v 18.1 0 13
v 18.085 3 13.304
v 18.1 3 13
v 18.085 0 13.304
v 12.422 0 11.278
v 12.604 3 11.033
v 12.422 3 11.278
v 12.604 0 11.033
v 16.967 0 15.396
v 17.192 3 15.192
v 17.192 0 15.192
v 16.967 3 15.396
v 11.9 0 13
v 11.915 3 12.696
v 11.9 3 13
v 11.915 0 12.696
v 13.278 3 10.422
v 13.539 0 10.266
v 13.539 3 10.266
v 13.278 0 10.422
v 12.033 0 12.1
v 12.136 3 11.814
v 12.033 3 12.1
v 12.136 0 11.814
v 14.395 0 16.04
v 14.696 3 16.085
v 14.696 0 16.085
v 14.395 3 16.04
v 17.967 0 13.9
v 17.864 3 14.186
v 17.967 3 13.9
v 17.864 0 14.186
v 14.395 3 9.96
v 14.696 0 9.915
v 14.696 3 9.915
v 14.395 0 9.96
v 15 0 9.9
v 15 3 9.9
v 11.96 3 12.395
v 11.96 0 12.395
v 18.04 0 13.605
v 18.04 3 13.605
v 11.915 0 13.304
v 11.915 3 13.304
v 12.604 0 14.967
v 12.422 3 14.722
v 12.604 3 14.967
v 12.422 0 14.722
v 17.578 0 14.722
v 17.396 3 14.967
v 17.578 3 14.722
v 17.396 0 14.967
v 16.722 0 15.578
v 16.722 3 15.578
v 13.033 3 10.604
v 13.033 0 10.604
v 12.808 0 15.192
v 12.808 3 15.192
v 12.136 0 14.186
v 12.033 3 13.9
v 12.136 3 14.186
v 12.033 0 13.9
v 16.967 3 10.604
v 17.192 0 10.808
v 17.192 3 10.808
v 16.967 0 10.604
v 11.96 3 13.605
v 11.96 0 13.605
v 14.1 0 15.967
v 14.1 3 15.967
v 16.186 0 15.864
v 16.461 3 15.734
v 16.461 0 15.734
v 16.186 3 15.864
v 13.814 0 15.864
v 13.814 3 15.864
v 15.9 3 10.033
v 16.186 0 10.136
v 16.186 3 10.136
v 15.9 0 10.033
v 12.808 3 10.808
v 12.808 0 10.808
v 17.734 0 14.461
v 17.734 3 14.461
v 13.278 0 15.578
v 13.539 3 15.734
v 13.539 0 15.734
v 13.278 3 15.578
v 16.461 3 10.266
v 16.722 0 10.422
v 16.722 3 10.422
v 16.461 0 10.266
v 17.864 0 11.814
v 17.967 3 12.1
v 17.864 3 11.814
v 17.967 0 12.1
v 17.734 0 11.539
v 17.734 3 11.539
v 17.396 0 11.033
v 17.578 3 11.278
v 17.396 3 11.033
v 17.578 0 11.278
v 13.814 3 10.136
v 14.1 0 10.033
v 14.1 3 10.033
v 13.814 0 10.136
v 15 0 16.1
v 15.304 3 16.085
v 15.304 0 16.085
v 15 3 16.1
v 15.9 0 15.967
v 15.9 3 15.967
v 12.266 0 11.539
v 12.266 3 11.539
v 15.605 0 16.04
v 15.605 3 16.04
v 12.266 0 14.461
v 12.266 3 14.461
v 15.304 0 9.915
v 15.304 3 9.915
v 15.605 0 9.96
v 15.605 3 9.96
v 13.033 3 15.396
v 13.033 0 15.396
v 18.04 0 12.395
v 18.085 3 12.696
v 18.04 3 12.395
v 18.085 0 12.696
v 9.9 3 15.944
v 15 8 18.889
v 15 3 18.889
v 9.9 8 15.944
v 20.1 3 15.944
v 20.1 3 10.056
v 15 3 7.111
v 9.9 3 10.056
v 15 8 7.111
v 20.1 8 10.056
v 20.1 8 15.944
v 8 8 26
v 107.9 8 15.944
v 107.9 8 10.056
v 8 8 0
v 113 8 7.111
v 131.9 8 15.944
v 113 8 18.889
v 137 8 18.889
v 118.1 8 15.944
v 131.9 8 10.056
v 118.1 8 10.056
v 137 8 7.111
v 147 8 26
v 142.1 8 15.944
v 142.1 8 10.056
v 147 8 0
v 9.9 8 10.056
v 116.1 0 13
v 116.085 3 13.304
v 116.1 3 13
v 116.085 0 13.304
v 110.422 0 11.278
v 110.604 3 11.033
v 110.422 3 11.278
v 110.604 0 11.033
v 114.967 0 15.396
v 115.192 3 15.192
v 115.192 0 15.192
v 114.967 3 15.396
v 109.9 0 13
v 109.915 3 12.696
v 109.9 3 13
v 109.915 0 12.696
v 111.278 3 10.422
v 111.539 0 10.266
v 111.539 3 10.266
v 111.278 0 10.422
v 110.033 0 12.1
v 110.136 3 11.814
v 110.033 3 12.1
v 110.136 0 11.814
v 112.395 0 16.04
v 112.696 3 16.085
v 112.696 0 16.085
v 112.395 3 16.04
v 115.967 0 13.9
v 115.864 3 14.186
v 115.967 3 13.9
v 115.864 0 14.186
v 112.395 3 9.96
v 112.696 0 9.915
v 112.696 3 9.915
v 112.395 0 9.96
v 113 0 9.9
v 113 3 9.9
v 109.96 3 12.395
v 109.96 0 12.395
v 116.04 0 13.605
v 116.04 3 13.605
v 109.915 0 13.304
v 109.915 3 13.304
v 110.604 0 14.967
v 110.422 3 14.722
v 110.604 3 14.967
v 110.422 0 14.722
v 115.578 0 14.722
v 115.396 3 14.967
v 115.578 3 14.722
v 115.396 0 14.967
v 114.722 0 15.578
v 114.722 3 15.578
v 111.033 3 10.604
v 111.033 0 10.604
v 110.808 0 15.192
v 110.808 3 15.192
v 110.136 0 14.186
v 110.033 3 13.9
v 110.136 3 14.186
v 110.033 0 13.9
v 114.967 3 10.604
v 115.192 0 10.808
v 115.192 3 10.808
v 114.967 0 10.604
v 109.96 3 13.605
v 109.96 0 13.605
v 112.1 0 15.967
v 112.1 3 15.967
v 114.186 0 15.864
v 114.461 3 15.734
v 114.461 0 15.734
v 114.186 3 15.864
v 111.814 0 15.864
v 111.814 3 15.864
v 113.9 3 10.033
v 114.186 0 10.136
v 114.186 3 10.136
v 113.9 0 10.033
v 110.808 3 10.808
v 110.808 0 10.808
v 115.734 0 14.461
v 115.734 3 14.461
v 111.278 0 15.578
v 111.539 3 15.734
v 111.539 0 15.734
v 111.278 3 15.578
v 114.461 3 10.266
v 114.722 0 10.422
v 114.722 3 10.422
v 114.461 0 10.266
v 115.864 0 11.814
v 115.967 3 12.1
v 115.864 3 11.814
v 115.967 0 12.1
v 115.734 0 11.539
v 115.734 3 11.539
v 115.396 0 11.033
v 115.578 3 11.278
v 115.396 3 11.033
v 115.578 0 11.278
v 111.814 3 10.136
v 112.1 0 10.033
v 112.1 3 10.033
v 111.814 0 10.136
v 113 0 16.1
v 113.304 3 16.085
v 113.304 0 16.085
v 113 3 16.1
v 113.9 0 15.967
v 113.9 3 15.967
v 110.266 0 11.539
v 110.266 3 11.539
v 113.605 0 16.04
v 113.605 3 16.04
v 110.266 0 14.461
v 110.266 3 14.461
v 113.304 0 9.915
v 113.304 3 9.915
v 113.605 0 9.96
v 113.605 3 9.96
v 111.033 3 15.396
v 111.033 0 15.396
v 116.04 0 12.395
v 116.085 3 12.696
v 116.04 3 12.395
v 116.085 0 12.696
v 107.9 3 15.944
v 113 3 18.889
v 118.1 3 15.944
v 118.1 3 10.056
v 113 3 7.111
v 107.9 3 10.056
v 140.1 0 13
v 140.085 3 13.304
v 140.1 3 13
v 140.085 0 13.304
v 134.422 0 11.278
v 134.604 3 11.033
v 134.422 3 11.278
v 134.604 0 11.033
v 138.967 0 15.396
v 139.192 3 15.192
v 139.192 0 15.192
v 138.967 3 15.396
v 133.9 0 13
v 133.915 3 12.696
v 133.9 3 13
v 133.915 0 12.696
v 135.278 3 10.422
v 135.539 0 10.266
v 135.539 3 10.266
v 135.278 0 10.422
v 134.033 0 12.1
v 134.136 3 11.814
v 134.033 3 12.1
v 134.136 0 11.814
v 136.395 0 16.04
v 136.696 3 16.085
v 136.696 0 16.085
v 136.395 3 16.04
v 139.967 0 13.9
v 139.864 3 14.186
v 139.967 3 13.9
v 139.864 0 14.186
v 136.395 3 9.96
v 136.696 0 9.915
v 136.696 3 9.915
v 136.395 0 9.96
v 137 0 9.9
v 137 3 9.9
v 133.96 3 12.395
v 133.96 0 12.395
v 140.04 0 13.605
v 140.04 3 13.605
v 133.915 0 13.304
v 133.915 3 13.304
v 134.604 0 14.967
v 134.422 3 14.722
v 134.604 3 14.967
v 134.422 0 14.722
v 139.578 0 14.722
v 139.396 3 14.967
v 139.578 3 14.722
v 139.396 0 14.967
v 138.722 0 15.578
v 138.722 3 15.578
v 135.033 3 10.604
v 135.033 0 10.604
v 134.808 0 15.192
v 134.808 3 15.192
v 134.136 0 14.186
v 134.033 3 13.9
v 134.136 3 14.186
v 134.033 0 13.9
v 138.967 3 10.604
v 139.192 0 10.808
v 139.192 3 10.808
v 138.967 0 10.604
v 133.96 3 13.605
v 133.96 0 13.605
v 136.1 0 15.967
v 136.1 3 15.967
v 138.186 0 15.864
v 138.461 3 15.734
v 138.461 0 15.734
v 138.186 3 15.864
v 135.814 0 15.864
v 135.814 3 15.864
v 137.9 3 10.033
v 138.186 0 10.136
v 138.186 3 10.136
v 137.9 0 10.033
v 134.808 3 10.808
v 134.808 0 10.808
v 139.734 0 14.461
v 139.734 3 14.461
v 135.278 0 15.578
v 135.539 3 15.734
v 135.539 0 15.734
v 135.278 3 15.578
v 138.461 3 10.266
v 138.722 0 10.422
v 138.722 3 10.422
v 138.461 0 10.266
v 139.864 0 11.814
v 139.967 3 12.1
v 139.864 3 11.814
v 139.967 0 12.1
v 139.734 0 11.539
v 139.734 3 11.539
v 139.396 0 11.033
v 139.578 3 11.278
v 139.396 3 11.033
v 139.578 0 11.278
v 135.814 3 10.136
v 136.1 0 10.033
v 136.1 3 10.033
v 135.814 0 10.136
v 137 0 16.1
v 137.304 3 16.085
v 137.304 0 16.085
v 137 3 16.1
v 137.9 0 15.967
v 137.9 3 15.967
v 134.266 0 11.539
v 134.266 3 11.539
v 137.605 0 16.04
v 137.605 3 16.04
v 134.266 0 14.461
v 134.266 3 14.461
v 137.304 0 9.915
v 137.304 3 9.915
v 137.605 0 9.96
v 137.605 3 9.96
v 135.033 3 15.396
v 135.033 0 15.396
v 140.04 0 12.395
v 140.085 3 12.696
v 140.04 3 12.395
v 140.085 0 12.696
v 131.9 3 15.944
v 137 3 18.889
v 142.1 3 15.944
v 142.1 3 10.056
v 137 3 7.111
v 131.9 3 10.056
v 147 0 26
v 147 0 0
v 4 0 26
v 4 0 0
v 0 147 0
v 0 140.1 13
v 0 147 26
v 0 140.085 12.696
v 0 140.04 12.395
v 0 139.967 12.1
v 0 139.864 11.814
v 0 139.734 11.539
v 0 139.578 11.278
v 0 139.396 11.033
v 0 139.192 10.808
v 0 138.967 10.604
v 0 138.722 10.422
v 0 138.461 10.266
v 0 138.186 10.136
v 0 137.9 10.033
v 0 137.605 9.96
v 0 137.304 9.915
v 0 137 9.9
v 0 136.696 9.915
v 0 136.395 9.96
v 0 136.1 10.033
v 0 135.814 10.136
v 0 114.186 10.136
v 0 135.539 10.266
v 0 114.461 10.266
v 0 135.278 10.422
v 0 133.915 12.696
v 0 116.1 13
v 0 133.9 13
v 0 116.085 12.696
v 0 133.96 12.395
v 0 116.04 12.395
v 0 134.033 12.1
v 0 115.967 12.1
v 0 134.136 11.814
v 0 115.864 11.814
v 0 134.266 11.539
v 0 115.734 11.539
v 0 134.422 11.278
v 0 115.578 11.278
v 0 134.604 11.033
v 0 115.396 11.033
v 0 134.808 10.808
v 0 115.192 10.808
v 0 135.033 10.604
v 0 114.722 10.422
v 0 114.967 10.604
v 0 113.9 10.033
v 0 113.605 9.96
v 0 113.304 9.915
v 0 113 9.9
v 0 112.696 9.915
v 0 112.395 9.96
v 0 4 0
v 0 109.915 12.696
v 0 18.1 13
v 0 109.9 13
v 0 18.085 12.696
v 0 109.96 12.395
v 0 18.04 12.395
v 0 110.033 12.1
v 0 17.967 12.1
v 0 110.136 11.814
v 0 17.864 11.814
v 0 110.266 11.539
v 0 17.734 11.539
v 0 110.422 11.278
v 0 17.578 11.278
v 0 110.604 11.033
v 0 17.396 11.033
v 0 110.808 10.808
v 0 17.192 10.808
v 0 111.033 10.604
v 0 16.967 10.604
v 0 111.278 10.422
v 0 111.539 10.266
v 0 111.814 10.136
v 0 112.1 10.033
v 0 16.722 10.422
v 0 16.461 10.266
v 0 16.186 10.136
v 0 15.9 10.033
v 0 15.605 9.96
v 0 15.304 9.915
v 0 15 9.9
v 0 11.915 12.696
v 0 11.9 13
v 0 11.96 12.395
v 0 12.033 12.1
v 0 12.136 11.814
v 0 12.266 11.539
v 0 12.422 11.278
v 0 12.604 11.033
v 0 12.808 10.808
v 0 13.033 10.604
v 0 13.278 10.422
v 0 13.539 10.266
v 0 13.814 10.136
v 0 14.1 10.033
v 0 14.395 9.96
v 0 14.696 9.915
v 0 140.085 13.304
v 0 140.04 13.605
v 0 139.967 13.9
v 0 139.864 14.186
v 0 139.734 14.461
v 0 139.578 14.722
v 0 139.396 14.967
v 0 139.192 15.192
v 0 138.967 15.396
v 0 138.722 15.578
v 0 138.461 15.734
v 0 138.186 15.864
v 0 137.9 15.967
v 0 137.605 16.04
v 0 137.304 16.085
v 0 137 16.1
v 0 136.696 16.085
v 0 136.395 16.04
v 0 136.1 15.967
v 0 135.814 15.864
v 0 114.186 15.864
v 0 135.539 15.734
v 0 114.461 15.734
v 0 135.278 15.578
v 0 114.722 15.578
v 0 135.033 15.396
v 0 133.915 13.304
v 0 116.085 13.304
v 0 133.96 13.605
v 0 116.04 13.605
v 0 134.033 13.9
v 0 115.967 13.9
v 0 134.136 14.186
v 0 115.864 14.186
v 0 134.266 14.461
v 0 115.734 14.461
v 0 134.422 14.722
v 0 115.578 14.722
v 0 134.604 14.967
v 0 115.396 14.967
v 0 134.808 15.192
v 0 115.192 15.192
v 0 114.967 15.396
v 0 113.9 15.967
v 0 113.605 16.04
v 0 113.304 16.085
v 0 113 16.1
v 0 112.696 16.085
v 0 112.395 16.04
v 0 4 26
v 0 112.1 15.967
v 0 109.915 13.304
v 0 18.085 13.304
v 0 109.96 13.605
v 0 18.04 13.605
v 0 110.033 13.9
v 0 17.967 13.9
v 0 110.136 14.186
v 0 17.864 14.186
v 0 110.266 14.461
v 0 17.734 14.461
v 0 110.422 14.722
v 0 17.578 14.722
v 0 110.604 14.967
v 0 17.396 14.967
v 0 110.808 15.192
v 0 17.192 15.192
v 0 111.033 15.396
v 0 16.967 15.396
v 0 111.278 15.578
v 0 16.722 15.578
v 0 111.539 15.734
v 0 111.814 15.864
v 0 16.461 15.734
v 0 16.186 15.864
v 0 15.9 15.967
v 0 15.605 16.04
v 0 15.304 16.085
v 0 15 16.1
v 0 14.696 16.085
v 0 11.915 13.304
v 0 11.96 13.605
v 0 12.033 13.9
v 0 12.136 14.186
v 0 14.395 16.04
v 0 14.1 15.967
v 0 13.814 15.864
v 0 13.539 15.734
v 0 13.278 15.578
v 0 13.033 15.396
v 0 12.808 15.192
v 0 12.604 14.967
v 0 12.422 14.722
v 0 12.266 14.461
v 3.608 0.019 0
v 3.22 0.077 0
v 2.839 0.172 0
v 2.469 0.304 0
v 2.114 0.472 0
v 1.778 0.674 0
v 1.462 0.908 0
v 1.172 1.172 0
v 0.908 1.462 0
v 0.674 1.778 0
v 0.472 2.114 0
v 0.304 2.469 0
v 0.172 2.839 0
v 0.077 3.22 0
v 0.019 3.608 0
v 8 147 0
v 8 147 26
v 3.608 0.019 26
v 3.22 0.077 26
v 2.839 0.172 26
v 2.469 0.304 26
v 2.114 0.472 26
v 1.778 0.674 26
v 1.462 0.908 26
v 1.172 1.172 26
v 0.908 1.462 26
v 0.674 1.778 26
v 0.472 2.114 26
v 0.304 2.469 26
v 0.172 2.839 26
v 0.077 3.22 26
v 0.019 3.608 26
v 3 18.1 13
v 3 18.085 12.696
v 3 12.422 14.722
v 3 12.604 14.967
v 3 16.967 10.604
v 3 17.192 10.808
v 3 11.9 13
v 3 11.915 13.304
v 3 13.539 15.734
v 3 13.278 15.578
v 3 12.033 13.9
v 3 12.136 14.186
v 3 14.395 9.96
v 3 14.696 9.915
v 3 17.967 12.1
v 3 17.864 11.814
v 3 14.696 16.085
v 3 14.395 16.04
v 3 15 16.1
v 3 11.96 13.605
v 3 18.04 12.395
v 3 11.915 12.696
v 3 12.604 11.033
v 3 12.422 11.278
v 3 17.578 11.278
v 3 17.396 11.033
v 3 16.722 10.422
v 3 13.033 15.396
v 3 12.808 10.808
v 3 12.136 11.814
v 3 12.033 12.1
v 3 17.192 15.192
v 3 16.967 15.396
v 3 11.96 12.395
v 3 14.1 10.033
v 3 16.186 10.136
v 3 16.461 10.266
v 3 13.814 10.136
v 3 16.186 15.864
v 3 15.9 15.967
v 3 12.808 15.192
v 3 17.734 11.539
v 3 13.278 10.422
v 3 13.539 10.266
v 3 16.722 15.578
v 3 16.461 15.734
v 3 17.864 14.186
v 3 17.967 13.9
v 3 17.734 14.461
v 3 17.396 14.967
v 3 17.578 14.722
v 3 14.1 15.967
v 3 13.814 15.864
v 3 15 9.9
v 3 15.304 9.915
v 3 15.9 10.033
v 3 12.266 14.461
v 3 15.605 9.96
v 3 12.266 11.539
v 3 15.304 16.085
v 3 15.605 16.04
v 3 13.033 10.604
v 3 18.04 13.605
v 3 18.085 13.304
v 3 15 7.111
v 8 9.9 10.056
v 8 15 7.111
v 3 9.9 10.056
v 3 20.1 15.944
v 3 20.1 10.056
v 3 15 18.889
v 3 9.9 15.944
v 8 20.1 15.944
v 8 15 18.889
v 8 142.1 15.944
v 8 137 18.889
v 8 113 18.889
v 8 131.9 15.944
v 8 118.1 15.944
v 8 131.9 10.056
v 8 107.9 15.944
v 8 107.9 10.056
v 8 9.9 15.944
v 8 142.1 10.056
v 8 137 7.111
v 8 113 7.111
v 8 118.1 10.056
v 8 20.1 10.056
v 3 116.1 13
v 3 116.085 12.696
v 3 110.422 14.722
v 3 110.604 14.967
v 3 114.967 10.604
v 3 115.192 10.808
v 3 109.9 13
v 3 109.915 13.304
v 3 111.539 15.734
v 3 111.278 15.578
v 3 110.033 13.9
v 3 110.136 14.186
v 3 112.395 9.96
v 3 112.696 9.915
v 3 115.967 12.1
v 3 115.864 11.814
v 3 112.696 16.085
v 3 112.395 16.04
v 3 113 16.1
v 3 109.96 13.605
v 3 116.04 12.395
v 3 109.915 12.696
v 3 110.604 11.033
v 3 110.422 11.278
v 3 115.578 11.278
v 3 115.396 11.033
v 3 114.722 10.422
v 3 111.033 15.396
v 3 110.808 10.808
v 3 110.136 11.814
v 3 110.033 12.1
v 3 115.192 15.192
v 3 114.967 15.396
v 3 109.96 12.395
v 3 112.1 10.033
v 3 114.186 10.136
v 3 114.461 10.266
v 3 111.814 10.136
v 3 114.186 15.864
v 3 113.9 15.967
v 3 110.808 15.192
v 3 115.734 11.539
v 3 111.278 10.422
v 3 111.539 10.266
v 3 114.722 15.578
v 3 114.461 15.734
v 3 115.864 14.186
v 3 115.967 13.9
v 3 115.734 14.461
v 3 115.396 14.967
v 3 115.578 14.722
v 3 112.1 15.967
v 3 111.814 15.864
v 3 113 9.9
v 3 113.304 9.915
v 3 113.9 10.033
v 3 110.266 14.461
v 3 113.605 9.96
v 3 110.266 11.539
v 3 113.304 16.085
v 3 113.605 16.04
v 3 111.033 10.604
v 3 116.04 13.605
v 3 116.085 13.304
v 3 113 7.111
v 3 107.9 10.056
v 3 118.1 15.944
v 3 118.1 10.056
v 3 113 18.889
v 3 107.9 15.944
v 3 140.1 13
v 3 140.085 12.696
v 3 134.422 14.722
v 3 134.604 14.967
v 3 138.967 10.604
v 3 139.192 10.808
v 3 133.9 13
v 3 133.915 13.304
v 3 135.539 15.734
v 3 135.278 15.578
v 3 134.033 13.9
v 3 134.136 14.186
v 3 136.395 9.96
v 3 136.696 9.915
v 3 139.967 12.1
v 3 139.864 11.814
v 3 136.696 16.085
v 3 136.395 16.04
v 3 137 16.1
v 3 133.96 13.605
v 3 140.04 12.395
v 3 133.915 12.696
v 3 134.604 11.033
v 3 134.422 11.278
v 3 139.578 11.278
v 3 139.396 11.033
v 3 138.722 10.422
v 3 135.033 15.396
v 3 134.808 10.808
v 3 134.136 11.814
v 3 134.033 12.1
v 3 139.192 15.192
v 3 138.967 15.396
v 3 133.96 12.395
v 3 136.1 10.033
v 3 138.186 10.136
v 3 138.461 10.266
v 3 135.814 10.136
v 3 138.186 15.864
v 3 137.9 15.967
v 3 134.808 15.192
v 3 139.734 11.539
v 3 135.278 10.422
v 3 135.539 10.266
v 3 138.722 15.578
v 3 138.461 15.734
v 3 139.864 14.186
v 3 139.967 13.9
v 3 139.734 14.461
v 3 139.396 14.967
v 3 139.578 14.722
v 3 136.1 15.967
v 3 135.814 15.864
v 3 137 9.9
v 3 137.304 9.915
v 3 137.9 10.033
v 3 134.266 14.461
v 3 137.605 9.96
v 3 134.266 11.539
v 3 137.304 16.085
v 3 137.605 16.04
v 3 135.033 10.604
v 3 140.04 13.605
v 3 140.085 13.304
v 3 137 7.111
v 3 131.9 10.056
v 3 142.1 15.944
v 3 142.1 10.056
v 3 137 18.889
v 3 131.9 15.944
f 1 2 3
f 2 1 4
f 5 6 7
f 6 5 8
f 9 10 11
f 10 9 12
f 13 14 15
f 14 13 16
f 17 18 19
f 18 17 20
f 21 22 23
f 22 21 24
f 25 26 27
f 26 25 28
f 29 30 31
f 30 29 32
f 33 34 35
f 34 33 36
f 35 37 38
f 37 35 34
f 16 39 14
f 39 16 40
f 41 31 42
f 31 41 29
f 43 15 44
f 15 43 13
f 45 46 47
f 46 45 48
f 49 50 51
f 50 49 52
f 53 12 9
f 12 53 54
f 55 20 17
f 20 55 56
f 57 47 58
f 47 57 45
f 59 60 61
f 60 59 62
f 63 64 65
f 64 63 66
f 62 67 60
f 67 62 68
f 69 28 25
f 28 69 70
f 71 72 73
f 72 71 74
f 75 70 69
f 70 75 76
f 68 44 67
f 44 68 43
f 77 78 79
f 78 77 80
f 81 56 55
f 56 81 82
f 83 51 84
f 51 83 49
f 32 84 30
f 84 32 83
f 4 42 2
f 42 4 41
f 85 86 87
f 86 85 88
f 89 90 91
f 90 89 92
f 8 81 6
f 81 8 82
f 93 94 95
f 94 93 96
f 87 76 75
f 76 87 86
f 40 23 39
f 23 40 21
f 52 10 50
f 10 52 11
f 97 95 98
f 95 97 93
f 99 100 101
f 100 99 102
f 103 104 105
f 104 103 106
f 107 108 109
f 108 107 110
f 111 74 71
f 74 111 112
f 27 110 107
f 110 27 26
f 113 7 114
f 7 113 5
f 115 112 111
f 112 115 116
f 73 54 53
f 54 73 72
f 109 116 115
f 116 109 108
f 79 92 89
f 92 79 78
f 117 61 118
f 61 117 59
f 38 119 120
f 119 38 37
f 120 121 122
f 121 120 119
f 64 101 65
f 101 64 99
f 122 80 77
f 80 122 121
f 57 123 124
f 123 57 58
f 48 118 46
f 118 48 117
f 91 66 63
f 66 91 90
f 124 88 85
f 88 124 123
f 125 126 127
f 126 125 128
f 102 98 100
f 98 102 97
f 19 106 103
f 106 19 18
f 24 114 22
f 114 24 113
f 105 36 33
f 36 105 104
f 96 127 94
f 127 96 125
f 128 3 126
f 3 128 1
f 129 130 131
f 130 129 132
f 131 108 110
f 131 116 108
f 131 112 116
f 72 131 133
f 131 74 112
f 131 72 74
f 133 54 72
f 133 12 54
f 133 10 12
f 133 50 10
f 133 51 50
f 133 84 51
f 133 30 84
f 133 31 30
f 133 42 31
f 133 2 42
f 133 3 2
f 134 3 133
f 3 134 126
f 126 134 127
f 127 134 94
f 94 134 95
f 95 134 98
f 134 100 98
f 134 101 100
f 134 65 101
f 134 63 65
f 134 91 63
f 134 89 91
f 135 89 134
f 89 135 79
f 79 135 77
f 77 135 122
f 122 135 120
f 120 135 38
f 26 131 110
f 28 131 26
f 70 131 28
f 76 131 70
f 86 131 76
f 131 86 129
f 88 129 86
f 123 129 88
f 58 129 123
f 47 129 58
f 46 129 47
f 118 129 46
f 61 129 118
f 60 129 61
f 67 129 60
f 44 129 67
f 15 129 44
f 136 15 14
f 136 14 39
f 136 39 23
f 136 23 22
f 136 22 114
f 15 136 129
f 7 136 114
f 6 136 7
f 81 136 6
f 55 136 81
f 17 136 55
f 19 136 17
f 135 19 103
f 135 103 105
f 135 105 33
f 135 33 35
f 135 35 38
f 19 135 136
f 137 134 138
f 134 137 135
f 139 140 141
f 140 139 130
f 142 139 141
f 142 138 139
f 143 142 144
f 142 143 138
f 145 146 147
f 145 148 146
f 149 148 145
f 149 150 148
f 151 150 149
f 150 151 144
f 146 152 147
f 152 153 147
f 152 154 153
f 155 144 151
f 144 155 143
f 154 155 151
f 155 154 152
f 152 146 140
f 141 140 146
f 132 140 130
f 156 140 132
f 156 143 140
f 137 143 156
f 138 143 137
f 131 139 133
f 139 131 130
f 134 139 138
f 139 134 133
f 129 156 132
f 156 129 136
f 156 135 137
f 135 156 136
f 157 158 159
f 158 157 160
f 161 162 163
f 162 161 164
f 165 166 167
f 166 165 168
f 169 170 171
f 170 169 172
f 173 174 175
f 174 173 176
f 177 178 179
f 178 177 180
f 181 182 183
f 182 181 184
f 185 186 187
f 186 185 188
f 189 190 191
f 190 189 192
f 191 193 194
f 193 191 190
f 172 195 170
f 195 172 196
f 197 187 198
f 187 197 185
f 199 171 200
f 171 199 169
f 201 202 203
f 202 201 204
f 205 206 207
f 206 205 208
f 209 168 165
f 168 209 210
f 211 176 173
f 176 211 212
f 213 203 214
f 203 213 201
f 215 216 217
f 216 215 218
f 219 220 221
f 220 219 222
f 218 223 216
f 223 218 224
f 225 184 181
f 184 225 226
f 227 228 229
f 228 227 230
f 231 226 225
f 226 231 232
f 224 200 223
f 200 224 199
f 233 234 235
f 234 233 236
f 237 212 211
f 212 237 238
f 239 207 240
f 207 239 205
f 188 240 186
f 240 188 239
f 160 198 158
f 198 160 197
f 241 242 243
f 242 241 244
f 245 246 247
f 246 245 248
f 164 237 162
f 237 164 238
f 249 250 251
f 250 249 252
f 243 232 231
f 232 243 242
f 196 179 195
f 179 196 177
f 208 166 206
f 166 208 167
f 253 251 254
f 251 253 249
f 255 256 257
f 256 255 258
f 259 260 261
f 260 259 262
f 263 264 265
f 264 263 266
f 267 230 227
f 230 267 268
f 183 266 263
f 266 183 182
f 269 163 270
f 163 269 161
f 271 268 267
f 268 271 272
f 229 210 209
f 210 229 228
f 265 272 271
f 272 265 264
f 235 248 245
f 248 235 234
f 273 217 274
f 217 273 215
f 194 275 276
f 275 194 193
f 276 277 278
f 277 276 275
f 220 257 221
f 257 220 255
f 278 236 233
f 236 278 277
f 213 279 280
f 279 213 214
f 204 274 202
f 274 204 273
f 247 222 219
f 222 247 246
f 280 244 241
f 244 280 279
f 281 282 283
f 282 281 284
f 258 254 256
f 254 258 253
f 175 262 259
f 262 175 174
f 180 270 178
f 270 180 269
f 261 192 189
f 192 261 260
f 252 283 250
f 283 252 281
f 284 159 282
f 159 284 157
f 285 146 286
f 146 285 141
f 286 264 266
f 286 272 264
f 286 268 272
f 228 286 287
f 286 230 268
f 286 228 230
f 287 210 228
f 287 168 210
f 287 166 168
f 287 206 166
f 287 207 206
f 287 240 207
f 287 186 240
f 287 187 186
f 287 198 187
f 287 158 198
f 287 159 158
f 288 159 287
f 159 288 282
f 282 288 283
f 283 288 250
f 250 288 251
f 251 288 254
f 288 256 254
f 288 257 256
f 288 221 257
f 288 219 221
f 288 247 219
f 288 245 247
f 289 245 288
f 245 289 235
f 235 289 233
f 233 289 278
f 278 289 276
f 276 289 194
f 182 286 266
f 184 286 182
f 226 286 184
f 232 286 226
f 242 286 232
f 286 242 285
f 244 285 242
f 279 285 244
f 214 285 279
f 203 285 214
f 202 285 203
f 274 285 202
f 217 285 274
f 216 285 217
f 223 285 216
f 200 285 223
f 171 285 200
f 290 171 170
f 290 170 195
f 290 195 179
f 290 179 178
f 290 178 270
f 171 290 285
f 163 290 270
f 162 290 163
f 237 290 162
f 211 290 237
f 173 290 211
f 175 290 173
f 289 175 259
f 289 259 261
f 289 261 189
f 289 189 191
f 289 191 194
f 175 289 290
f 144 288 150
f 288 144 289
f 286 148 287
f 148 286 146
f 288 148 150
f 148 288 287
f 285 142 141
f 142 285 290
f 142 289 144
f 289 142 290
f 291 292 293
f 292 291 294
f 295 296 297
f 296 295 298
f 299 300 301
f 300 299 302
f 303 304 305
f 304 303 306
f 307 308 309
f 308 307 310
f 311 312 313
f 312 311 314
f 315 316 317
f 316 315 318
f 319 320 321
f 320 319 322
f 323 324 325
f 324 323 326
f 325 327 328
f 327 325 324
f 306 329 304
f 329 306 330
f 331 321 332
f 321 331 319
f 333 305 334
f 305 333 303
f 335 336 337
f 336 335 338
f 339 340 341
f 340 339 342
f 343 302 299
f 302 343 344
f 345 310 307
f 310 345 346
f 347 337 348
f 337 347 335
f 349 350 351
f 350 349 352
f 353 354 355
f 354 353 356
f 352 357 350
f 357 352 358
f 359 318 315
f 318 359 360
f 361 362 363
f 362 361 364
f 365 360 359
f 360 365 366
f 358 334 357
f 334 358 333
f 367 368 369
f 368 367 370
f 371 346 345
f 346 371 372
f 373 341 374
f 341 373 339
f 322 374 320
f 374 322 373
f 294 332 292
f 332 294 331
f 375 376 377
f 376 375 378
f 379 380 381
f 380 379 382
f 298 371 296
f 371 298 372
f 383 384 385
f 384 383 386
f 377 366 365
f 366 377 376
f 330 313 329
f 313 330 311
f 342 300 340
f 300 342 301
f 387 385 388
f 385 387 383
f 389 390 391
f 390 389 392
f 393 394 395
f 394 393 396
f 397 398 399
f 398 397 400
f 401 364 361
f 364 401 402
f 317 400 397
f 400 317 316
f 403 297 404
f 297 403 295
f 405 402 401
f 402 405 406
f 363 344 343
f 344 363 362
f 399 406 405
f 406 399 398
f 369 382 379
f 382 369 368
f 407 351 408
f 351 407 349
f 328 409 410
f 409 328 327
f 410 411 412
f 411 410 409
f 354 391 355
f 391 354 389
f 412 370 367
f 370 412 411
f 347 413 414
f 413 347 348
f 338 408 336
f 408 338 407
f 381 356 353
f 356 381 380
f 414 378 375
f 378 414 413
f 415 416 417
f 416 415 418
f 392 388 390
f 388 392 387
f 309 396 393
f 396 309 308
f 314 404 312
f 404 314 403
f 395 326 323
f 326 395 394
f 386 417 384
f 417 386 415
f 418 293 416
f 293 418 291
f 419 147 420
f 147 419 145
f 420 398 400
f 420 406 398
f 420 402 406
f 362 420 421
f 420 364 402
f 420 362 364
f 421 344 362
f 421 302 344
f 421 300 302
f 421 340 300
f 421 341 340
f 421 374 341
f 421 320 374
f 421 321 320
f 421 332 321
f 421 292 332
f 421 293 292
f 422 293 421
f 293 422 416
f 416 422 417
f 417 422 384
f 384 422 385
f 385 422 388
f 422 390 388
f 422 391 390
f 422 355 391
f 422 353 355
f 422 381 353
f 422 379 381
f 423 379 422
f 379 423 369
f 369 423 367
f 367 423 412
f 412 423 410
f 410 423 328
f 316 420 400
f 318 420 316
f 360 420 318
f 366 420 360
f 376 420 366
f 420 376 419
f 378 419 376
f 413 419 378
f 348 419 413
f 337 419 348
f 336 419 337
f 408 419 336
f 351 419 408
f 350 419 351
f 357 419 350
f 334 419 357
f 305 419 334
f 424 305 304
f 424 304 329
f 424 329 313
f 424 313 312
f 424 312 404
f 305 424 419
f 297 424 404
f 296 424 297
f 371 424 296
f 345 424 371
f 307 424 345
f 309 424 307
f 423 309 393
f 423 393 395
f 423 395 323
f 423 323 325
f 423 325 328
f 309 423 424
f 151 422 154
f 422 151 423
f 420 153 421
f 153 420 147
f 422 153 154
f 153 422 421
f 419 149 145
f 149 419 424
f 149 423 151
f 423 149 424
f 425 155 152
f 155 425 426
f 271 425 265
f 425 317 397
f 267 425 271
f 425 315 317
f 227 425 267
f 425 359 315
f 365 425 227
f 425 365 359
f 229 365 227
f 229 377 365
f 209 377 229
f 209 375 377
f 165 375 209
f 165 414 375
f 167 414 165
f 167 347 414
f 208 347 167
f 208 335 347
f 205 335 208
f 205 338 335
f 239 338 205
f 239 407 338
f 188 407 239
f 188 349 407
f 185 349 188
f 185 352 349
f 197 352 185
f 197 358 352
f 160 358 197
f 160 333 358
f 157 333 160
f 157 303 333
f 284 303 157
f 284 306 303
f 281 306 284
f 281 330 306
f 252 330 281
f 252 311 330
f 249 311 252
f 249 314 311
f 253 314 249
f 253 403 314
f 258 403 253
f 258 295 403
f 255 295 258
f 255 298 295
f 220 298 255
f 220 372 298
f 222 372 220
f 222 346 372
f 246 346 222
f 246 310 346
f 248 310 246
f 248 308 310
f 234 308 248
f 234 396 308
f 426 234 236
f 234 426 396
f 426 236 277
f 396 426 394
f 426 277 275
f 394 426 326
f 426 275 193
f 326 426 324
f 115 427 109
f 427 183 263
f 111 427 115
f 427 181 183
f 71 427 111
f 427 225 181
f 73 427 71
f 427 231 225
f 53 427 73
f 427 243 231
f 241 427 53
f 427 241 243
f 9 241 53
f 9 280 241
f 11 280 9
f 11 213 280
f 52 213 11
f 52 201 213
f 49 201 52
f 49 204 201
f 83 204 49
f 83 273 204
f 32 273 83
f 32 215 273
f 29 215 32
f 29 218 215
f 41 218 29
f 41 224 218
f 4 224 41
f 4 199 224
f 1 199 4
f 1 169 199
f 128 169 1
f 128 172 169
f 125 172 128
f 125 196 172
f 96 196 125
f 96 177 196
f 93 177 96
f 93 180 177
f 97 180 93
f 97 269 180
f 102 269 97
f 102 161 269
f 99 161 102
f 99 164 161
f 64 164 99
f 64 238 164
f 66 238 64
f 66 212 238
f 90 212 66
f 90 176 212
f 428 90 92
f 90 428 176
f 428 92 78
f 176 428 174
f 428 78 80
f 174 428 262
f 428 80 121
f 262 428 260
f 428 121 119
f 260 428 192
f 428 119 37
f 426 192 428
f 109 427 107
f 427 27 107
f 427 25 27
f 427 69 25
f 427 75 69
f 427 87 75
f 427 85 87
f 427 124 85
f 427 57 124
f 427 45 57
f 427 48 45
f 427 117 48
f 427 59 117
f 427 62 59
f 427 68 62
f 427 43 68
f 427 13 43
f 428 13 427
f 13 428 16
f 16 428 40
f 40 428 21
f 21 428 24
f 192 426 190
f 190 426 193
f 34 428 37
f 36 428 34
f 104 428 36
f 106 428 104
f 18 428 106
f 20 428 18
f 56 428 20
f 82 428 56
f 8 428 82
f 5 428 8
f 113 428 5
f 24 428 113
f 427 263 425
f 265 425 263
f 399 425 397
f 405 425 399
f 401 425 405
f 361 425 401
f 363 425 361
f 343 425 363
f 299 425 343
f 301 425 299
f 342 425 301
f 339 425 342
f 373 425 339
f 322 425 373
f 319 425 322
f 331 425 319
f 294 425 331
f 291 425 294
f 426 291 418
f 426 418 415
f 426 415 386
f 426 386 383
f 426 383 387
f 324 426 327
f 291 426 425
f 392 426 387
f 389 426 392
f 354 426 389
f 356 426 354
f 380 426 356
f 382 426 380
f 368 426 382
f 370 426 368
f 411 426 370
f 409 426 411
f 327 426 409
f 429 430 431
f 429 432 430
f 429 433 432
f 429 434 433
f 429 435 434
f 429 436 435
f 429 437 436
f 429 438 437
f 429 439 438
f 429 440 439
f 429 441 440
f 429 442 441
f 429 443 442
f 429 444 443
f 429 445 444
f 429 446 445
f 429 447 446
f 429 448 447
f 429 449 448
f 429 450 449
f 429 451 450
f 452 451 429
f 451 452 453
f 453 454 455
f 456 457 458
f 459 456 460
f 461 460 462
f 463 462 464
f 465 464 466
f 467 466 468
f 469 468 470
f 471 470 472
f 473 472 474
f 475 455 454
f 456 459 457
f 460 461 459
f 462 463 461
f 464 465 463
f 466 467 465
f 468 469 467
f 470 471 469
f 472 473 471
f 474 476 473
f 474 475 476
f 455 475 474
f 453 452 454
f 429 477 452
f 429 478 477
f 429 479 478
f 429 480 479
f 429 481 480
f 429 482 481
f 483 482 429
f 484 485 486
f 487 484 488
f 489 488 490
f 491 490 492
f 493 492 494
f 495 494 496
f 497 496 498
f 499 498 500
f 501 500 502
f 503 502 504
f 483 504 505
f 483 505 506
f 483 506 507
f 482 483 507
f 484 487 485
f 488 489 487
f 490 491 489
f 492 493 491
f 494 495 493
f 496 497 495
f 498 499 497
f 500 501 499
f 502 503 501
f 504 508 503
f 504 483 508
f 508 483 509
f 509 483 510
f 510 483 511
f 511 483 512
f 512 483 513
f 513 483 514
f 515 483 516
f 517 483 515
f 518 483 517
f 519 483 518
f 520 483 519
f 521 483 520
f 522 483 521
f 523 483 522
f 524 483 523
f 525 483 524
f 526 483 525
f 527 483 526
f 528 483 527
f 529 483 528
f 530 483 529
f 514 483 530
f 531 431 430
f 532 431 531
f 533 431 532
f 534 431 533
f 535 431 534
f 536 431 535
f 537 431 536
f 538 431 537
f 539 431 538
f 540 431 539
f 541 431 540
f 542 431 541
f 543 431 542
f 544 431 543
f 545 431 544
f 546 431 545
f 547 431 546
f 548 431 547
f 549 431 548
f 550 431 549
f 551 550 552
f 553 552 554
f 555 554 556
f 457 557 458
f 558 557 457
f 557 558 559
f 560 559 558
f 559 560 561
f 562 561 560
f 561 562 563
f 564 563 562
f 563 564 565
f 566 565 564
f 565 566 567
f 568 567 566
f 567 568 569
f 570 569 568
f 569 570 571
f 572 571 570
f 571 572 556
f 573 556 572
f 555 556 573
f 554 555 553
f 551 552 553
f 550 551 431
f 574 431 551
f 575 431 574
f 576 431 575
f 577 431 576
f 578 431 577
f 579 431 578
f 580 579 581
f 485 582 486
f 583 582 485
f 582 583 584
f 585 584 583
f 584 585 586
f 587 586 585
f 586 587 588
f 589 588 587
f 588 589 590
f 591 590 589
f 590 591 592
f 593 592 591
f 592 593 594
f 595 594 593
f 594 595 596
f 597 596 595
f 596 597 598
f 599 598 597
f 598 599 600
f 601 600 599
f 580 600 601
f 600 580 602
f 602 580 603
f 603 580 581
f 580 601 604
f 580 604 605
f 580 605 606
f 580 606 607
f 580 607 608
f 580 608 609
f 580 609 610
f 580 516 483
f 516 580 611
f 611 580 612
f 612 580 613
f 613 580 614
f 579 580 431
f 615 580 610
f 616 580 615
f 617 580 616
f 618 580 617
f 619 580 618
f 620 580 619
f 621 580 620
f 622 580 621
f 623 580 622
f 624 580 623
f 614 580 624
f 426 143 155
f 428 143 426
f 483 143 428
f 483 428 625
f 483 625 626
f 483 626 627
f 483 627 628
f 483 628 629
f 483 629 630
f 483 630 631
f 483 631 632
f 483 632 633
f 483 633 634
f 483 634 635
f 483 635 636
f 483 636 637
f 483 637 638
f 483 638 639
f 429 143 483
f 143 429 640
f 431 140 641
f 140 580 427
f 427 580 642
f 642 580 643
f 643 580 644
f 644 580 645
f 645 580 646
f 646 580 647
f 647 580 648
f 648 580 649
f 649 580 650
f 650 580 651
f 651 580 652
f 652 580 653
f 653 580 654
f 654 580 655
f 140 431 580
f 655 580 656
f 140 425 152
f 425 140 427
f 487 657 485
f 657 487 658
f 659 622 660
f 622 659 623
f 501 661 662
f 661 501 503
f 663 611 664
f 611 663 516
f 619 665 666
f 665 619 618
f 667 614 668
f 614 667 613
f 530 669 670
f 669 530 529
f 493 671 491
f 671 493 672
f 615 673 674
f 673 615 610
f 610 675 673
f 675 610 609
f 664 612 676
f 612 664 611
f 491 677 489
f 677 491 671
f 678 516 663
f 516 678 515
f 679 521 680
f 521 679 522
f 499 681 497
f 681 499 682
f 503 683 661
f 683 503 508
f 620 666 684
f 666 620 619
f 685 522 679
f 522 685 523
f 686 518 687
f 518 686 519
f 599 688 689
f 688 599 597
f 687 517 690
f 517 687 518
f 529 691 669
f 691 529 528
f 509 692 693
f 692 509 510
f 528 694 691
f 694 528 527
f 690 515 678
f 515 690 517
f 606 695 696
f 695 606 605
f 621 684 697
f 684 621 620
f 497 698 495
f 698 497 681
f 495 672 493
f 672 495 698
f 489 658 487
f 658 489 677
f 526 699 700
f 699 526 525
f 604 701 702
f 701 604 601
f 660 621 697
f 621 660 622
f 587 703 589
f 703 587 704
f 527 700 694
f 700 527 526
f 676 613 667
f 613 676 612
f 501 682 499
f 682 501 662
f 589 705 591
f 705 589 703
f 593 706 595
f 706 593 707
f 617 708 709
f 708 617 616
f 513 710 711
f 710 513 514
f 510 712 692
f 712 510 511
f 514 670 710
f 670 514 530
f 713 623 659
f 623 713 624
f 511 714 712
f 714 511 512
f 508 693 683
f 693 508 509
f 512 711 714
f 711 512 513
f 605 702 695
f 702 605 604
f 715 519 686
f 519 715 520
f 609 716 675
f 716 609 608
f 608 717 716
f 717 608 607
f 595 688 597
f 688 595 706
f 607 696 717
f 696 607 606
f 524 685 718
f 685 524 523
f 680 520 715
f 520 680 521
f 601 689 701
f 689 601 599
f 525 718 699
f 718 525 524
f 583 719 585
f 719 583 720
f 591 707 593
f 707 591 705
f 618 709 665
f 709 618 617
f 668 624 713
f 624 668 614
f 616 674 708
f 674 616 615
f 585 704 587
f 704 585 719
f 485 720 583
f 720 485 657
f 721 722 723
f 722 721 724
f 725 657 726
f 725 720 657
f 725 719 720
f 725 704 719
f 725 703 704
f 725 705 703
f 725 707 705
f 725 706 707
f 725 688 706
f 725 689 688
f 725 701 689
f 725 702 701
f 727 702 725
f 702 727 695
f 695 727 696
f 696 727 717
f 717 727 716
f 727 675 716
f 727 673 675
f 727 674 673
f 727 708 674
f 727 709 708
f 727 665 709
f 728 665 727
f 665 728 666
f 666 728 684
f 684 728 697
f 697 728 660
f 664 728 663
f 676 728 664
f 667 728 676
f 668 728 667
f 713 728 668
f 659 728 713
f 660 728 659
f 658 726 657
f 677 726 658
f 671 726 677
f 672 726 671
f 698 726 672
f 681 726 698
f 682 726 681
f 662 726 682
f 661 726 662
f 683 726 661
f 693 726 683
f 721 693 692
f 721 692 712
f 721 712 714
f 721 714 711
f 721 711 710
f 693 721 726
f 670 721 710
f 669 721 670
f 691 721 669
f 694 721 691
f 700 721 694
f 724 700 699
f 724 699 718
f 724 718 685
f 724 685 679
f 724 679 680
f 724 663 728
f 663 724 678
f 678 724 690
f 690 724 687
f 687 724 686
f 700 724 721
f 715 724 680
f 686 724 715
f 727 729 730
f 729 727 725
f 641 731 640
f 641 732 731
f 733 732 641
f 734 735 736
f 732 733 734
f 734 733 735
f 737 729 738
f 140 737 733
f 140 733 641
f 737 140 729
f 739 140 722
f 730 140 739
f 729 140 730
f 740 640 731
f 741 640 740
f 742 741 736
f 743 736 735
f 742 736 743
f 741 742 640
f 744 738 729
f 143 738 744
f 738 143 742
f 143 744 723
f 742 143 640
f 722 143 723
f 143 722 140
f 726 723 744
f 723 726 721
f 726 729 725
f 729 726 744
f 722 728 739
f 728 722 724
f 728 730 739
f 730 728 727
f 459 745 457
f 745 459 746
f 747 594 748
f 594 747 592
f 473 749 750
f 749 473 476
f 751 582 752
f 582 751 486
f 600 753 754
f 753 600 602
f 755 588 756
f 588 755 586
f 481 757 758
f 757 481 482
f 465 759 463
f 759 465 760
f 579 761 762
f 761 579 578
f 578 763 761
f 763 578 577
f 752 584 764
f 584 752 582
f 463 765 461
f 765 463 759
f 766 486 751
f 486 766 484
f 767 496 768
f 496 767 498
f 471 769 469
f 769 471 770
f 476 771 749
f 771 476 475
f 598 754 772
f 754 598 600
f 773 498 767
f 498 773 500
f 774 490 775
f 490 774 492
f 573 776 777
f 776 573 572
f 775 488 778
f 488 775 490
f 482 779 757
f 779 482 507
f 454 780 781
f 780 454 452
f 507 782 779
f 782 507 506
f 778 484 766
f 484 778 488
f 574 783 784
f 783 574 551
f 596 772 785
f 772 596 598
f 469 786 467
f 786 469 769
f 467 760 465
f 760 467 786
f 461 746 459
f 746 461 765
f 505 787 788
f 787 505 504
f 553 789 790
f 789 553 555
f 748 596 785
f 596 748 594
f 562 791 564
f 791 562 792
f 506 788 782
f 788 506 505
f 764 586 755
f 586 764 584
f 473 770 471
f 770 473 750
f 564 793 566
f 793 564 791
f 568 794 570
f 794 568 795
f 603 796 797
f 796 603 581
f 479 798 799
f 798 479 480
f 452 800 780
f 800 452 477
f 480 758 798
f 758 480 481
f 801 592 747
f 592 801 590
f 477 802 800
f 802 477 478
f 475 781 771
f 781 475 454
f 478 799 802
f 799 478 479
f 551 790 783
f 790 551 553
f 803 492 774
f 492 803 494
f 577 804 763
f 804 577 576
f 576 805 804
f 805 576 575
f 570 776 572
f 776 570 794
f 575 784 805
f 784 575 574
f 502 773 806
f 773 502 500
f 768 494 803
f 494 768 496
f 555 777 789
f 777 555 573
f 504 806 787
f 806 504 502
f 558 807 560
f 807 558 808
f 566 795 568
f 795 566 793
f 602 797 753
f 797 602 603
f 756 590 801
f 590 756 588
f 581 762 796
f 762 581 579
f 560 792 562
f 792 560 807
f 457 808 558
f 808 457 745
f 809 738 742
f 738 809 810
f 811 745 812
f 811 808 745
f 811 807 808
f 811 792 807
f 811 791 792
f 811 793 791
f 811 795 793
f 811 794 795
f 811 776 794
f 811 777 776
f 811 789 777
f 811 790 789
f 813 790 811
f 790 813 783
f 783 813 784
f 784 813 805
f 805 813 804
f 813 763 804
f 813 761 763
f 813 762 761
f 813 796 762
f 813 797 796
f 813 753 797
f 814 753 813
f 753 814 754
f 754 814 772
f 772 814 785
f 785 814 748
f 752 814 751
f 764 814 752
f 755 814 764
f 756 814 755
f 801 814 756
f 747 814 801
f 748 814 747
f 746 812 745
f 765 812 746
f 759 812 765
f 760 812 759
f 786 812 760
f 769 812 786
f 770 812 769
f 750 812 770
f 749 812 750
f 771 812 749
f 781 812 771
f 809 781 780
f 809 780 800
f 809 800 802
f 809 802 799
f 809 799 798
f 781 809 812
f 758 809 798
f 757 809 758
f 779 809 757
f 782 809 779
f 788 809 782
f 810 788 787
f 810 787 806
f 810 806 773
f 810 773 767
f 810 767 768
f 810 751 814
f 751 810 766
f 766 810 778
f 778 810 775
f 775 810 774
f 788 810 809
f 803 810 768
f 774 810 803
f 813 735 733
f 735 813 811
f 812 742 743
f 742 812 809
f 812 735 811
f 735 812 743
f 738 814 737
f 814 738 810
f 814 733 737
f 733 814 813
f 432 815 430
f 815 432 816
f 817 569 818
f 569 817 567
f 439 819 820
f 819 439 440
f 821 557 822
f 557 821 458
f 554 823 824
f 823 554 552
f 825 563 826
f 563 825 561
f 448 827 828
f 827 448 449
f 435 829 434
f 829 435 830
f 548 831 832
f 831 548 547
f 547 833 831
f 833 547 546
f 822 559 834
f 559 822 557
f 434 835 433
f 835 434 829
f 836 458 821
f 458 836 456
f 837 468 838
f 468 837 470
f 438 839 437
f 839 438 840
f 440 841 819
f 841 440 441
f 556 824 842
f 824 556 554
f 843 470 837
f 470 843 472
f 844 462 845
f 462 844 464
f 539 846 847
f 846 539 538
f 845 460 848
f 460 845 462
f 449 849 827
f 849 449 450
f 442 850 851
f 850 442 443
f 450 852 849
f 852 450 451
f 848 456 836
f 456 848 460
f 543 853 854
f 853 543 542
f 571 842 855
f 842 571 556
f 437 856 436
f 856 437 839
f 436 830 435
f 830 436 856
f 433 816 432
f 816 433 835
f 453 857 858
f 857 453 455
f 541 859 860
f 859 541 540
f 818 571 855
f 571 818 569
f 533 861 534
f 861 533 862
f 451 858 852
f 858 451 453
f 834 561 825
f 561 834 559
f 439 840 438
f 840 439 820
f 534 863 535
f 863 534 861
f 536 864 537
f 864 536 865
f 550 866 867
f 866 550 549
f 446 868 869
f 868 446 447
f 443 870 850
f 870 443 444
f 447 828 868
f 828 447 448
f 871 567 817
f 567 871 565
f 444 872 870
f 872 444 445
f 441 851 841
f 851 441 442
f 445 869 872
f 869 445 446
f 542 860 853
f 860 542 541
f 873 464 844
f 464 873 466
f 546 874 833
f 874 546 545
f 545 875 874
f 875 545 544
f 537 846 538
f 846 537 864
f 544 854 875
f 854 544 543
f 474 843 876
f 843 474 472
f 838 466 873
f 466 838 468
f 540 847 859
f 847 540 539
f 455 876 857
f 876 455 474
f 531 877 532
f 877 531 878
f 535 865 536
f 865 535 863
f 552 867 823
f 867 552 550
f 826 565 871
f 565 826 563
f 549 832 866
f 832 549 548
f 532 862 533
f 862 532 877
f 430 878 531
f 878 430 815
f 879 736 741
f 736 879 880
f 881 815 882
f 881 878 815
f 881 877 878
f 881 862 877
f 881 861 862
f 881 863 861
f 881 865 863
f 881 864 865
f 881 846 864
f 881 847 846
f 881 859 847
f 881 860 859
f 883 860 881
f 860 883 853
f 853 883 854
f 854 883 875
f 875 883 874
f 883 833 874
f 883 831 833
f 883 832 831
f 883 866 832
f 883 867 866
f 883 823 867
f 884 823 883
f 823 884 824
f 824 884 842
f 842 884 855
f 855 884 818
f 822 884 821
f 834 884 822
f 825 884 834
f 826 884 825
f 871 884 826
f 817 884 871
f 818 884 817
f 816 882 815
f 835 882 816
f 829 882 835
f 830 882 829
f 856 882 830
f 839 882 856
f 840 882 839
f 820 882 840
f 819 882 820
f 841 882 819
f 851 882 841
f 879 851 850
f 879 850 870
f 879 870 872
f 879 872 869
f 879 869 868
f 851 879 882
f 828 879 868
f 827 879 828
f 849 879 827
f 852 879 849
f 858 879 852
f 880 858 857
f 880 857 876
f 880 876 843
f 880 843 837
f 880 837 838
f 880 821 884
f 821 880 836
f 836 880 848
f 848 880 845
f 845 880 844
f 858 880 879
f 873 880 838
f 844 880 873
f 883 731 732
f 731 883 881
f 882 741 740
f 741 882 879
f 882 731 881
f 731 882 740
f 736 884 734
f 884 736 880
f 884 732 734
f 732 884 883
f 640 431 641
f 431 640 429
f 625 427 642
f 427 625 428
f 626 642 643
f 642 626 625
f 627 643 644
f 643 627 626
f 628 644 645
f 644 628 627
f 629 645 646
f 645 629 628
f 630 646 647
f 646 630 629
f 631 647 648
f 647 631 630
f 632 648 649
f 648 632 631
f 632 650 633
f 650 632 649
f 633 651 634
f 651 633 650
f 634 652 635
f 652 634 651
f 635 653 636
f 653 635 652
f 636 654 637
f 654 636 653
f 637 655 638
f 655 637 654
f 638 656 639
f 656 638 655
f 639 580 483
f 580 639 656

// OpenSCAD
// file: ../../../modules/bolts.scad
module nut_trap(d, h, center = true) {
  linear_extrude(height = h, center = center)
  circle(d = d / cos(30), $fn = 6);
}

module bolt_hole(d, h, center = true) {
  linear_extrude(height = h, center = center)
  circle(d = d, $fn = 64);
}

// Hex holes for self-tapping (nominal - 0.2mm)
module hex_hole(flat_d, h) {
  linear_extrude(height = h, center = true)
  circle(d = flat_d / cos(30), $fn = 6);
}

module m3_bolt_hexhole(h) {
  rotate([0, 0, 90])
  hex_hole(flat_d = 2.8, h = h);
}

module m4_bolt_hexhole(h) {
  rotate([0, 0, 90])
  hex_hole(flat_d = 3.8, h = h);
}

module m6_bolt_hexhole(h) {
  rotate([0, 0, 90])
  hex_hole(flat_d = 5.8, h = h);
}

module m8_bolt_hexhole(h) {

  rotate([0, 0, 90])

  hex_hole(flat_d = 7.8, h = h);

}





// --- Size-specific, separated modules for flexible placement ---



// M3

module m3_bolt_hole(h, center = false) {

  bolt_hole(d = 3.4, h = h, center = center);

}

module m3_nut_trap(h, center = false) {

  nut_trap(d = 5.7, h = h, center = center);

}



// M4

module m4_bolt_hole(h, center = false) {

  bolt_hole(d = 4.4, h = h, center = center);

}

module m4_nut_trap(h, center = false) {

  nut_trap(d = 7.5, h = h, center = center);

}



// M6

module m6_bolt_hole(h, center = false) {

  bolt_hole(d = 6.2, h = h, center = center);

}

module m6_nut_trap(h, center = false) {

  nut_trap(d = 10.2, h = h, center = center);

}



// M8

module m8_bolt_hole(h, center = false) {

  bolt_hole(d = 8.4, h = h, center = center);

}

module m8_nut_trap(h, center = false) {

  nut_trap(d = 13.3, h = h, center = center);

}
// main file
use <../../../modules/bolts.scad>;
width = 147;
height = 26;
deps = 8;
radius = 4;

difference() {
  union(){
    translate([0, 0, height])
    rotate([90, 180, 180])
    long_bar(width, height, deps);
    
    translate([0, 0, 0])
    rotate([90, 0, 90])
    long_bar(width, height, deps);
  }

  translate([deps / 2, deps / 2, 0])
  rotate([0, 0, 180])
  fillet_profile(radius, height * 2 + 1);
}

module fillet_profile(r, h) {
  linear_extrude(height = h, center = true)
  difference() {
    square([r, r]);
    circle(r = r, $fn = 64);
  }
}

module long_bar (w, y, h) {
  difference() {
    translate([w / 2, y / 2, h / 2])
    cube([w, y, h], center=true);

    translate([15, y / 2, 0])
    union() {
        nut_thickness = 5; // M6 nut height

        // Replicates hole from z~0 to z~h
        translate([0, 0, h / 2])
        m6_bolt_hole(h + 1, center = true);

        // Replicates nut trap at the top surface (from z=h-thickness to z=h)
        translate([0, 0, h - nut_thickness / 2])
        rotate([0, 0, 90])
        m6_nut_trap(nut_thickness, center = true);
    };
    translate([15 + 98, y / 2, 0])
    union() {
        nut_thickness = 5; // M6 nut height

        // Replicates hole from z~0 to z~h
        translate([0, 0, h / 2])
        m6_bolt_hole(h + 1, center = true);

        // Replicates nut trap at the top surface (from z=h-thickness to z=h)
        translate([0, 0, h - nut_thickness / 2])
        rotate([0, 0, 90])
        m6_nut_trap(nut_thickness, center = true);
    };
    translate([15 + 98 + 24, y / 2, 0])
    union() {
        nut_thickness = 5; // M6 nut height

        // Replicates hole from z~0 to z~h
        translate([0, 0, h / 2])
        m6_bolt_hole(h + 1, center = true);

        // Replicates nut trap at the top surface (from z=h-thickness to z=h)
        translate([0, 0, h - nut_thickness / 2])
        rotate([0, 0, 90])
        m6_nut_trap(nut_thickness, center = true);
    };
  }
}
